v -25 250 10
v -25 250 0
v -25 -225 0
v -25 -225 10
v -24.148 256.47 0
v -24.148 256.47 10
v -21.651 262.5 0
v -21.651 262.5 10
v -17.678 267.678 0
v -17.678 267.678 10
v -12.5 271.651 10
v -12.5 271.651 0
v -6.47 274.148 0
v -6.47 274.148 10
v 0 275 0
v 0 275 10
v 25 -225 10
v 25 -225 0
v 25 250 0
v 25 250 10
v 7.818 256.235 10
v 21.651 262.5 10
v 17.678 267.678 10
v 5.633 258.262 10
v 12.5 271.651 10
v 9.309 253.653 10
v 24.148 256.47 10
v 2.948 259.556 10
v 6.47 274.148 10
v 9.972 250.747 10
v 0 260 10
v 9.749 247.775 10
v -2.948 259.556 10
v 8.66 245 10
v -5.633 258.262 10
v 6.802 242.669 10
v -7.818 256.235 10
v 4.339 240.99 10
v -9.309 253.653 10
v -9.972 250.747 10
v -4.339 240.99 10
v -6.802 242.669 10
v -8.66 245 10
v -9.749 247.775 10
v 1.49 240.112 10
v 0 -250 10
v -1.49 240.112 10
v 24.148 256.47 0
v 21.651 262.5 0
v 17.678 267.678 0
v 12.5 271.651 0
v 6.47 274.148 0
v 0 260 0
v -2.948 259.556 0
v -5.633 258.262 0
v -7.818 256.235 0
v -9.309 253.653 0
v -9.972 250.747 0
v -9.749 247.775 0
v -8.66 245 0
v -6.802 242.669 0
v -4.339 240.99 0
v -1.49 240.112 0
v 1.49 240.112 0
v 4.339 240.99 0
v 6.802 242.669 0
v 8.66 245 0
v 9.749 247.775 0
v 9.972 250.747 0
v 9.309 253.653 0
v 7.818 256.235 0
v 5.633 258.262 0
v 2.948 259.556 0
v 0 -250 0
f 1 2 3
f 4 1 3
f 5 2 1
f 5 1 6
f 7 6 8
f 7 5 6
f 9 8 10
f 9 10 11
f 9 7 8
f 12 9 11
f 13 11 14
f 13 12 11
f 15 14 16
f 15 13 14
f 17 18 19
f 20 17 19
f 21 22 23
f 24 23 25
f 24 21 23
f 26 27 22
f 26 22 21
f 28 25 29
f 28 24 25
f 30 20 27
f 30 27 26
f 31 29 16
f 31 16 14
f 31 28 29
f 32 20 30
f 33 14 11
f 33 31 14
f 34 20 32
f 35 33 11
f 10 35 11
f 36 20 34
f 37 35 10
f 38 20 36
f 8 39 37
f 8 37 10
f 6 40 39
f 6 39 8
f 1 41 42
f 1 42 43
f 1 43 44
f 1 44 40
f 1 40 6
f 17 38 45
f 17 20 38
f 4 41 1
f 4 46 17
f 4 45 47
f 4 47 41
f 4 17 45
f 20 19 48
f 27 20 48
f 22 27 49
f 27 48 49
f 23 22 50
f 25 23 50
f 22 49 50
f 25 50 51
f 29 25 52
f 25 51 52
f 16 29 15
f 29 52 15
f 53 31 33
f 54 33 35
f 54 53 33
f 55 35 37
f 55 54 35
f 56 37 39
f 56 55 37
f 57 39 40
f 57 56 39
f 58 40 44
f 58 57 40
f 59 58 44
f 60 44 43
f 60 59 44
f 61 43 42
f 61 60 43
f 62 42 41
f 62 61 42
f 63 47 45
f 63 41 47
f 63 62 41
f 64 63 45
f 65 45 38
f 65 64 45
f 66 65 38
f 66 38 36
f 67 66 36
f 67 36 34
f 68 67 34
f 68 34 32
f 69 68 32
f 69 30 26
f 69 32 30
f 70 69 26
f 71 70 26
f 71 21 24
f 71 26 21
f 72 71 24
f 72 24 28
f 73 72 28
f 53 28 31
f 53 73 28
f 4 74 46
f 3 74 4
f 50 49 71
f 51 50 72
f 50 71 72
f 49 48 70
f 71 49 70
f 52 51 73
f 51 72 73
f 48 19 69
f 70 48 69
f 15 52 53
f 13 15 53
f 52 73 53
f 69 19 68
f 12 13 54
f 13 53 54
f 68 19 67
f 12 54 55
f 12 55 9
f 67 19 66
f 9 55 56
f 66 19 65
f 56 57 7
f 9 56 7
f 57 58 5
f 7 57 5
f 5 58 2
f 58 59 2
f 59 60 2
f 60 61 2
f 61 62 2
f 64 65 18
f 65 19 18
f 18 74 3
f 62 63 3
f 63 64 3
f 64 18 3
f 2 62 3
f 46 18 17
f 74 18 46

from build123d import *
from build123d import SkipClean  # not in build123d's __all__

# Parameters (mm, degrees)
F1_DEPTH = 10
F5_DEPTH = 10.001
F7_DEPTH = 10


with BuildPart() as f1:
    # F0 (on Top) → F1 (new body)
    with BuildSketch(Plane.XY):
        with BuildLine():
            Line((0, 240), (0, 0))
            Line((0, 0), (25, 0))
            Line((25, 0), (25, 250))
            ThreePointArc((25, 250), (17.6776695297, 267.6776695297), (0, 275))
            Line((0, 275), (0, 260))
            ThreePointArc((0, 260), (10, 250), (0, 240))
        make_face()
    extrude(amount=F1_DEPTH)

    # F2: F1 across face


with BuildPart() as f1_1:
    add(f1.part, clean=False)
    with SkipClean():  # cleaning this boolean's faces spoils the solid; the shape is the same uncleaned
        add(f1.part.mirror(Plane(origin=(0, 120, 5), x_dir=(0, -1, 0), z_dir=(-1, 0, 0))), clean=False)

    # F3: F1 across face


with BuildPart() as f1_2:
    add(f1_1.part, clean=False)
    add(f1_1.part.mirror(Plane(origin=(12.5, 0, 5), x_dir=(1, 0, 0), z_dir=(0, -1, 0))), clean=False)

    # F4 (on Top) → F5 (cut, through all)
    with BuildSketch(Plane.XY):
        Polygon((50, -200), (0, -250), (-50, -200), (-50, -344.7760872496), (50, -344.7760872496), align=None)
    extrude(amount=F5_DEPTH, mode=Mode.SUBTRACT)

    # F6 (on face) → F7 (join, through all)
    with BuildSketch(Plane.XY.offset(10)):
        Polygon((11.9149819948, -238.0850180052), (-11.0190114938, -238.9809885062), (0, -250), align=None)
    extrude(amount=-F7_DEPTH)


solid = f1_2.part
